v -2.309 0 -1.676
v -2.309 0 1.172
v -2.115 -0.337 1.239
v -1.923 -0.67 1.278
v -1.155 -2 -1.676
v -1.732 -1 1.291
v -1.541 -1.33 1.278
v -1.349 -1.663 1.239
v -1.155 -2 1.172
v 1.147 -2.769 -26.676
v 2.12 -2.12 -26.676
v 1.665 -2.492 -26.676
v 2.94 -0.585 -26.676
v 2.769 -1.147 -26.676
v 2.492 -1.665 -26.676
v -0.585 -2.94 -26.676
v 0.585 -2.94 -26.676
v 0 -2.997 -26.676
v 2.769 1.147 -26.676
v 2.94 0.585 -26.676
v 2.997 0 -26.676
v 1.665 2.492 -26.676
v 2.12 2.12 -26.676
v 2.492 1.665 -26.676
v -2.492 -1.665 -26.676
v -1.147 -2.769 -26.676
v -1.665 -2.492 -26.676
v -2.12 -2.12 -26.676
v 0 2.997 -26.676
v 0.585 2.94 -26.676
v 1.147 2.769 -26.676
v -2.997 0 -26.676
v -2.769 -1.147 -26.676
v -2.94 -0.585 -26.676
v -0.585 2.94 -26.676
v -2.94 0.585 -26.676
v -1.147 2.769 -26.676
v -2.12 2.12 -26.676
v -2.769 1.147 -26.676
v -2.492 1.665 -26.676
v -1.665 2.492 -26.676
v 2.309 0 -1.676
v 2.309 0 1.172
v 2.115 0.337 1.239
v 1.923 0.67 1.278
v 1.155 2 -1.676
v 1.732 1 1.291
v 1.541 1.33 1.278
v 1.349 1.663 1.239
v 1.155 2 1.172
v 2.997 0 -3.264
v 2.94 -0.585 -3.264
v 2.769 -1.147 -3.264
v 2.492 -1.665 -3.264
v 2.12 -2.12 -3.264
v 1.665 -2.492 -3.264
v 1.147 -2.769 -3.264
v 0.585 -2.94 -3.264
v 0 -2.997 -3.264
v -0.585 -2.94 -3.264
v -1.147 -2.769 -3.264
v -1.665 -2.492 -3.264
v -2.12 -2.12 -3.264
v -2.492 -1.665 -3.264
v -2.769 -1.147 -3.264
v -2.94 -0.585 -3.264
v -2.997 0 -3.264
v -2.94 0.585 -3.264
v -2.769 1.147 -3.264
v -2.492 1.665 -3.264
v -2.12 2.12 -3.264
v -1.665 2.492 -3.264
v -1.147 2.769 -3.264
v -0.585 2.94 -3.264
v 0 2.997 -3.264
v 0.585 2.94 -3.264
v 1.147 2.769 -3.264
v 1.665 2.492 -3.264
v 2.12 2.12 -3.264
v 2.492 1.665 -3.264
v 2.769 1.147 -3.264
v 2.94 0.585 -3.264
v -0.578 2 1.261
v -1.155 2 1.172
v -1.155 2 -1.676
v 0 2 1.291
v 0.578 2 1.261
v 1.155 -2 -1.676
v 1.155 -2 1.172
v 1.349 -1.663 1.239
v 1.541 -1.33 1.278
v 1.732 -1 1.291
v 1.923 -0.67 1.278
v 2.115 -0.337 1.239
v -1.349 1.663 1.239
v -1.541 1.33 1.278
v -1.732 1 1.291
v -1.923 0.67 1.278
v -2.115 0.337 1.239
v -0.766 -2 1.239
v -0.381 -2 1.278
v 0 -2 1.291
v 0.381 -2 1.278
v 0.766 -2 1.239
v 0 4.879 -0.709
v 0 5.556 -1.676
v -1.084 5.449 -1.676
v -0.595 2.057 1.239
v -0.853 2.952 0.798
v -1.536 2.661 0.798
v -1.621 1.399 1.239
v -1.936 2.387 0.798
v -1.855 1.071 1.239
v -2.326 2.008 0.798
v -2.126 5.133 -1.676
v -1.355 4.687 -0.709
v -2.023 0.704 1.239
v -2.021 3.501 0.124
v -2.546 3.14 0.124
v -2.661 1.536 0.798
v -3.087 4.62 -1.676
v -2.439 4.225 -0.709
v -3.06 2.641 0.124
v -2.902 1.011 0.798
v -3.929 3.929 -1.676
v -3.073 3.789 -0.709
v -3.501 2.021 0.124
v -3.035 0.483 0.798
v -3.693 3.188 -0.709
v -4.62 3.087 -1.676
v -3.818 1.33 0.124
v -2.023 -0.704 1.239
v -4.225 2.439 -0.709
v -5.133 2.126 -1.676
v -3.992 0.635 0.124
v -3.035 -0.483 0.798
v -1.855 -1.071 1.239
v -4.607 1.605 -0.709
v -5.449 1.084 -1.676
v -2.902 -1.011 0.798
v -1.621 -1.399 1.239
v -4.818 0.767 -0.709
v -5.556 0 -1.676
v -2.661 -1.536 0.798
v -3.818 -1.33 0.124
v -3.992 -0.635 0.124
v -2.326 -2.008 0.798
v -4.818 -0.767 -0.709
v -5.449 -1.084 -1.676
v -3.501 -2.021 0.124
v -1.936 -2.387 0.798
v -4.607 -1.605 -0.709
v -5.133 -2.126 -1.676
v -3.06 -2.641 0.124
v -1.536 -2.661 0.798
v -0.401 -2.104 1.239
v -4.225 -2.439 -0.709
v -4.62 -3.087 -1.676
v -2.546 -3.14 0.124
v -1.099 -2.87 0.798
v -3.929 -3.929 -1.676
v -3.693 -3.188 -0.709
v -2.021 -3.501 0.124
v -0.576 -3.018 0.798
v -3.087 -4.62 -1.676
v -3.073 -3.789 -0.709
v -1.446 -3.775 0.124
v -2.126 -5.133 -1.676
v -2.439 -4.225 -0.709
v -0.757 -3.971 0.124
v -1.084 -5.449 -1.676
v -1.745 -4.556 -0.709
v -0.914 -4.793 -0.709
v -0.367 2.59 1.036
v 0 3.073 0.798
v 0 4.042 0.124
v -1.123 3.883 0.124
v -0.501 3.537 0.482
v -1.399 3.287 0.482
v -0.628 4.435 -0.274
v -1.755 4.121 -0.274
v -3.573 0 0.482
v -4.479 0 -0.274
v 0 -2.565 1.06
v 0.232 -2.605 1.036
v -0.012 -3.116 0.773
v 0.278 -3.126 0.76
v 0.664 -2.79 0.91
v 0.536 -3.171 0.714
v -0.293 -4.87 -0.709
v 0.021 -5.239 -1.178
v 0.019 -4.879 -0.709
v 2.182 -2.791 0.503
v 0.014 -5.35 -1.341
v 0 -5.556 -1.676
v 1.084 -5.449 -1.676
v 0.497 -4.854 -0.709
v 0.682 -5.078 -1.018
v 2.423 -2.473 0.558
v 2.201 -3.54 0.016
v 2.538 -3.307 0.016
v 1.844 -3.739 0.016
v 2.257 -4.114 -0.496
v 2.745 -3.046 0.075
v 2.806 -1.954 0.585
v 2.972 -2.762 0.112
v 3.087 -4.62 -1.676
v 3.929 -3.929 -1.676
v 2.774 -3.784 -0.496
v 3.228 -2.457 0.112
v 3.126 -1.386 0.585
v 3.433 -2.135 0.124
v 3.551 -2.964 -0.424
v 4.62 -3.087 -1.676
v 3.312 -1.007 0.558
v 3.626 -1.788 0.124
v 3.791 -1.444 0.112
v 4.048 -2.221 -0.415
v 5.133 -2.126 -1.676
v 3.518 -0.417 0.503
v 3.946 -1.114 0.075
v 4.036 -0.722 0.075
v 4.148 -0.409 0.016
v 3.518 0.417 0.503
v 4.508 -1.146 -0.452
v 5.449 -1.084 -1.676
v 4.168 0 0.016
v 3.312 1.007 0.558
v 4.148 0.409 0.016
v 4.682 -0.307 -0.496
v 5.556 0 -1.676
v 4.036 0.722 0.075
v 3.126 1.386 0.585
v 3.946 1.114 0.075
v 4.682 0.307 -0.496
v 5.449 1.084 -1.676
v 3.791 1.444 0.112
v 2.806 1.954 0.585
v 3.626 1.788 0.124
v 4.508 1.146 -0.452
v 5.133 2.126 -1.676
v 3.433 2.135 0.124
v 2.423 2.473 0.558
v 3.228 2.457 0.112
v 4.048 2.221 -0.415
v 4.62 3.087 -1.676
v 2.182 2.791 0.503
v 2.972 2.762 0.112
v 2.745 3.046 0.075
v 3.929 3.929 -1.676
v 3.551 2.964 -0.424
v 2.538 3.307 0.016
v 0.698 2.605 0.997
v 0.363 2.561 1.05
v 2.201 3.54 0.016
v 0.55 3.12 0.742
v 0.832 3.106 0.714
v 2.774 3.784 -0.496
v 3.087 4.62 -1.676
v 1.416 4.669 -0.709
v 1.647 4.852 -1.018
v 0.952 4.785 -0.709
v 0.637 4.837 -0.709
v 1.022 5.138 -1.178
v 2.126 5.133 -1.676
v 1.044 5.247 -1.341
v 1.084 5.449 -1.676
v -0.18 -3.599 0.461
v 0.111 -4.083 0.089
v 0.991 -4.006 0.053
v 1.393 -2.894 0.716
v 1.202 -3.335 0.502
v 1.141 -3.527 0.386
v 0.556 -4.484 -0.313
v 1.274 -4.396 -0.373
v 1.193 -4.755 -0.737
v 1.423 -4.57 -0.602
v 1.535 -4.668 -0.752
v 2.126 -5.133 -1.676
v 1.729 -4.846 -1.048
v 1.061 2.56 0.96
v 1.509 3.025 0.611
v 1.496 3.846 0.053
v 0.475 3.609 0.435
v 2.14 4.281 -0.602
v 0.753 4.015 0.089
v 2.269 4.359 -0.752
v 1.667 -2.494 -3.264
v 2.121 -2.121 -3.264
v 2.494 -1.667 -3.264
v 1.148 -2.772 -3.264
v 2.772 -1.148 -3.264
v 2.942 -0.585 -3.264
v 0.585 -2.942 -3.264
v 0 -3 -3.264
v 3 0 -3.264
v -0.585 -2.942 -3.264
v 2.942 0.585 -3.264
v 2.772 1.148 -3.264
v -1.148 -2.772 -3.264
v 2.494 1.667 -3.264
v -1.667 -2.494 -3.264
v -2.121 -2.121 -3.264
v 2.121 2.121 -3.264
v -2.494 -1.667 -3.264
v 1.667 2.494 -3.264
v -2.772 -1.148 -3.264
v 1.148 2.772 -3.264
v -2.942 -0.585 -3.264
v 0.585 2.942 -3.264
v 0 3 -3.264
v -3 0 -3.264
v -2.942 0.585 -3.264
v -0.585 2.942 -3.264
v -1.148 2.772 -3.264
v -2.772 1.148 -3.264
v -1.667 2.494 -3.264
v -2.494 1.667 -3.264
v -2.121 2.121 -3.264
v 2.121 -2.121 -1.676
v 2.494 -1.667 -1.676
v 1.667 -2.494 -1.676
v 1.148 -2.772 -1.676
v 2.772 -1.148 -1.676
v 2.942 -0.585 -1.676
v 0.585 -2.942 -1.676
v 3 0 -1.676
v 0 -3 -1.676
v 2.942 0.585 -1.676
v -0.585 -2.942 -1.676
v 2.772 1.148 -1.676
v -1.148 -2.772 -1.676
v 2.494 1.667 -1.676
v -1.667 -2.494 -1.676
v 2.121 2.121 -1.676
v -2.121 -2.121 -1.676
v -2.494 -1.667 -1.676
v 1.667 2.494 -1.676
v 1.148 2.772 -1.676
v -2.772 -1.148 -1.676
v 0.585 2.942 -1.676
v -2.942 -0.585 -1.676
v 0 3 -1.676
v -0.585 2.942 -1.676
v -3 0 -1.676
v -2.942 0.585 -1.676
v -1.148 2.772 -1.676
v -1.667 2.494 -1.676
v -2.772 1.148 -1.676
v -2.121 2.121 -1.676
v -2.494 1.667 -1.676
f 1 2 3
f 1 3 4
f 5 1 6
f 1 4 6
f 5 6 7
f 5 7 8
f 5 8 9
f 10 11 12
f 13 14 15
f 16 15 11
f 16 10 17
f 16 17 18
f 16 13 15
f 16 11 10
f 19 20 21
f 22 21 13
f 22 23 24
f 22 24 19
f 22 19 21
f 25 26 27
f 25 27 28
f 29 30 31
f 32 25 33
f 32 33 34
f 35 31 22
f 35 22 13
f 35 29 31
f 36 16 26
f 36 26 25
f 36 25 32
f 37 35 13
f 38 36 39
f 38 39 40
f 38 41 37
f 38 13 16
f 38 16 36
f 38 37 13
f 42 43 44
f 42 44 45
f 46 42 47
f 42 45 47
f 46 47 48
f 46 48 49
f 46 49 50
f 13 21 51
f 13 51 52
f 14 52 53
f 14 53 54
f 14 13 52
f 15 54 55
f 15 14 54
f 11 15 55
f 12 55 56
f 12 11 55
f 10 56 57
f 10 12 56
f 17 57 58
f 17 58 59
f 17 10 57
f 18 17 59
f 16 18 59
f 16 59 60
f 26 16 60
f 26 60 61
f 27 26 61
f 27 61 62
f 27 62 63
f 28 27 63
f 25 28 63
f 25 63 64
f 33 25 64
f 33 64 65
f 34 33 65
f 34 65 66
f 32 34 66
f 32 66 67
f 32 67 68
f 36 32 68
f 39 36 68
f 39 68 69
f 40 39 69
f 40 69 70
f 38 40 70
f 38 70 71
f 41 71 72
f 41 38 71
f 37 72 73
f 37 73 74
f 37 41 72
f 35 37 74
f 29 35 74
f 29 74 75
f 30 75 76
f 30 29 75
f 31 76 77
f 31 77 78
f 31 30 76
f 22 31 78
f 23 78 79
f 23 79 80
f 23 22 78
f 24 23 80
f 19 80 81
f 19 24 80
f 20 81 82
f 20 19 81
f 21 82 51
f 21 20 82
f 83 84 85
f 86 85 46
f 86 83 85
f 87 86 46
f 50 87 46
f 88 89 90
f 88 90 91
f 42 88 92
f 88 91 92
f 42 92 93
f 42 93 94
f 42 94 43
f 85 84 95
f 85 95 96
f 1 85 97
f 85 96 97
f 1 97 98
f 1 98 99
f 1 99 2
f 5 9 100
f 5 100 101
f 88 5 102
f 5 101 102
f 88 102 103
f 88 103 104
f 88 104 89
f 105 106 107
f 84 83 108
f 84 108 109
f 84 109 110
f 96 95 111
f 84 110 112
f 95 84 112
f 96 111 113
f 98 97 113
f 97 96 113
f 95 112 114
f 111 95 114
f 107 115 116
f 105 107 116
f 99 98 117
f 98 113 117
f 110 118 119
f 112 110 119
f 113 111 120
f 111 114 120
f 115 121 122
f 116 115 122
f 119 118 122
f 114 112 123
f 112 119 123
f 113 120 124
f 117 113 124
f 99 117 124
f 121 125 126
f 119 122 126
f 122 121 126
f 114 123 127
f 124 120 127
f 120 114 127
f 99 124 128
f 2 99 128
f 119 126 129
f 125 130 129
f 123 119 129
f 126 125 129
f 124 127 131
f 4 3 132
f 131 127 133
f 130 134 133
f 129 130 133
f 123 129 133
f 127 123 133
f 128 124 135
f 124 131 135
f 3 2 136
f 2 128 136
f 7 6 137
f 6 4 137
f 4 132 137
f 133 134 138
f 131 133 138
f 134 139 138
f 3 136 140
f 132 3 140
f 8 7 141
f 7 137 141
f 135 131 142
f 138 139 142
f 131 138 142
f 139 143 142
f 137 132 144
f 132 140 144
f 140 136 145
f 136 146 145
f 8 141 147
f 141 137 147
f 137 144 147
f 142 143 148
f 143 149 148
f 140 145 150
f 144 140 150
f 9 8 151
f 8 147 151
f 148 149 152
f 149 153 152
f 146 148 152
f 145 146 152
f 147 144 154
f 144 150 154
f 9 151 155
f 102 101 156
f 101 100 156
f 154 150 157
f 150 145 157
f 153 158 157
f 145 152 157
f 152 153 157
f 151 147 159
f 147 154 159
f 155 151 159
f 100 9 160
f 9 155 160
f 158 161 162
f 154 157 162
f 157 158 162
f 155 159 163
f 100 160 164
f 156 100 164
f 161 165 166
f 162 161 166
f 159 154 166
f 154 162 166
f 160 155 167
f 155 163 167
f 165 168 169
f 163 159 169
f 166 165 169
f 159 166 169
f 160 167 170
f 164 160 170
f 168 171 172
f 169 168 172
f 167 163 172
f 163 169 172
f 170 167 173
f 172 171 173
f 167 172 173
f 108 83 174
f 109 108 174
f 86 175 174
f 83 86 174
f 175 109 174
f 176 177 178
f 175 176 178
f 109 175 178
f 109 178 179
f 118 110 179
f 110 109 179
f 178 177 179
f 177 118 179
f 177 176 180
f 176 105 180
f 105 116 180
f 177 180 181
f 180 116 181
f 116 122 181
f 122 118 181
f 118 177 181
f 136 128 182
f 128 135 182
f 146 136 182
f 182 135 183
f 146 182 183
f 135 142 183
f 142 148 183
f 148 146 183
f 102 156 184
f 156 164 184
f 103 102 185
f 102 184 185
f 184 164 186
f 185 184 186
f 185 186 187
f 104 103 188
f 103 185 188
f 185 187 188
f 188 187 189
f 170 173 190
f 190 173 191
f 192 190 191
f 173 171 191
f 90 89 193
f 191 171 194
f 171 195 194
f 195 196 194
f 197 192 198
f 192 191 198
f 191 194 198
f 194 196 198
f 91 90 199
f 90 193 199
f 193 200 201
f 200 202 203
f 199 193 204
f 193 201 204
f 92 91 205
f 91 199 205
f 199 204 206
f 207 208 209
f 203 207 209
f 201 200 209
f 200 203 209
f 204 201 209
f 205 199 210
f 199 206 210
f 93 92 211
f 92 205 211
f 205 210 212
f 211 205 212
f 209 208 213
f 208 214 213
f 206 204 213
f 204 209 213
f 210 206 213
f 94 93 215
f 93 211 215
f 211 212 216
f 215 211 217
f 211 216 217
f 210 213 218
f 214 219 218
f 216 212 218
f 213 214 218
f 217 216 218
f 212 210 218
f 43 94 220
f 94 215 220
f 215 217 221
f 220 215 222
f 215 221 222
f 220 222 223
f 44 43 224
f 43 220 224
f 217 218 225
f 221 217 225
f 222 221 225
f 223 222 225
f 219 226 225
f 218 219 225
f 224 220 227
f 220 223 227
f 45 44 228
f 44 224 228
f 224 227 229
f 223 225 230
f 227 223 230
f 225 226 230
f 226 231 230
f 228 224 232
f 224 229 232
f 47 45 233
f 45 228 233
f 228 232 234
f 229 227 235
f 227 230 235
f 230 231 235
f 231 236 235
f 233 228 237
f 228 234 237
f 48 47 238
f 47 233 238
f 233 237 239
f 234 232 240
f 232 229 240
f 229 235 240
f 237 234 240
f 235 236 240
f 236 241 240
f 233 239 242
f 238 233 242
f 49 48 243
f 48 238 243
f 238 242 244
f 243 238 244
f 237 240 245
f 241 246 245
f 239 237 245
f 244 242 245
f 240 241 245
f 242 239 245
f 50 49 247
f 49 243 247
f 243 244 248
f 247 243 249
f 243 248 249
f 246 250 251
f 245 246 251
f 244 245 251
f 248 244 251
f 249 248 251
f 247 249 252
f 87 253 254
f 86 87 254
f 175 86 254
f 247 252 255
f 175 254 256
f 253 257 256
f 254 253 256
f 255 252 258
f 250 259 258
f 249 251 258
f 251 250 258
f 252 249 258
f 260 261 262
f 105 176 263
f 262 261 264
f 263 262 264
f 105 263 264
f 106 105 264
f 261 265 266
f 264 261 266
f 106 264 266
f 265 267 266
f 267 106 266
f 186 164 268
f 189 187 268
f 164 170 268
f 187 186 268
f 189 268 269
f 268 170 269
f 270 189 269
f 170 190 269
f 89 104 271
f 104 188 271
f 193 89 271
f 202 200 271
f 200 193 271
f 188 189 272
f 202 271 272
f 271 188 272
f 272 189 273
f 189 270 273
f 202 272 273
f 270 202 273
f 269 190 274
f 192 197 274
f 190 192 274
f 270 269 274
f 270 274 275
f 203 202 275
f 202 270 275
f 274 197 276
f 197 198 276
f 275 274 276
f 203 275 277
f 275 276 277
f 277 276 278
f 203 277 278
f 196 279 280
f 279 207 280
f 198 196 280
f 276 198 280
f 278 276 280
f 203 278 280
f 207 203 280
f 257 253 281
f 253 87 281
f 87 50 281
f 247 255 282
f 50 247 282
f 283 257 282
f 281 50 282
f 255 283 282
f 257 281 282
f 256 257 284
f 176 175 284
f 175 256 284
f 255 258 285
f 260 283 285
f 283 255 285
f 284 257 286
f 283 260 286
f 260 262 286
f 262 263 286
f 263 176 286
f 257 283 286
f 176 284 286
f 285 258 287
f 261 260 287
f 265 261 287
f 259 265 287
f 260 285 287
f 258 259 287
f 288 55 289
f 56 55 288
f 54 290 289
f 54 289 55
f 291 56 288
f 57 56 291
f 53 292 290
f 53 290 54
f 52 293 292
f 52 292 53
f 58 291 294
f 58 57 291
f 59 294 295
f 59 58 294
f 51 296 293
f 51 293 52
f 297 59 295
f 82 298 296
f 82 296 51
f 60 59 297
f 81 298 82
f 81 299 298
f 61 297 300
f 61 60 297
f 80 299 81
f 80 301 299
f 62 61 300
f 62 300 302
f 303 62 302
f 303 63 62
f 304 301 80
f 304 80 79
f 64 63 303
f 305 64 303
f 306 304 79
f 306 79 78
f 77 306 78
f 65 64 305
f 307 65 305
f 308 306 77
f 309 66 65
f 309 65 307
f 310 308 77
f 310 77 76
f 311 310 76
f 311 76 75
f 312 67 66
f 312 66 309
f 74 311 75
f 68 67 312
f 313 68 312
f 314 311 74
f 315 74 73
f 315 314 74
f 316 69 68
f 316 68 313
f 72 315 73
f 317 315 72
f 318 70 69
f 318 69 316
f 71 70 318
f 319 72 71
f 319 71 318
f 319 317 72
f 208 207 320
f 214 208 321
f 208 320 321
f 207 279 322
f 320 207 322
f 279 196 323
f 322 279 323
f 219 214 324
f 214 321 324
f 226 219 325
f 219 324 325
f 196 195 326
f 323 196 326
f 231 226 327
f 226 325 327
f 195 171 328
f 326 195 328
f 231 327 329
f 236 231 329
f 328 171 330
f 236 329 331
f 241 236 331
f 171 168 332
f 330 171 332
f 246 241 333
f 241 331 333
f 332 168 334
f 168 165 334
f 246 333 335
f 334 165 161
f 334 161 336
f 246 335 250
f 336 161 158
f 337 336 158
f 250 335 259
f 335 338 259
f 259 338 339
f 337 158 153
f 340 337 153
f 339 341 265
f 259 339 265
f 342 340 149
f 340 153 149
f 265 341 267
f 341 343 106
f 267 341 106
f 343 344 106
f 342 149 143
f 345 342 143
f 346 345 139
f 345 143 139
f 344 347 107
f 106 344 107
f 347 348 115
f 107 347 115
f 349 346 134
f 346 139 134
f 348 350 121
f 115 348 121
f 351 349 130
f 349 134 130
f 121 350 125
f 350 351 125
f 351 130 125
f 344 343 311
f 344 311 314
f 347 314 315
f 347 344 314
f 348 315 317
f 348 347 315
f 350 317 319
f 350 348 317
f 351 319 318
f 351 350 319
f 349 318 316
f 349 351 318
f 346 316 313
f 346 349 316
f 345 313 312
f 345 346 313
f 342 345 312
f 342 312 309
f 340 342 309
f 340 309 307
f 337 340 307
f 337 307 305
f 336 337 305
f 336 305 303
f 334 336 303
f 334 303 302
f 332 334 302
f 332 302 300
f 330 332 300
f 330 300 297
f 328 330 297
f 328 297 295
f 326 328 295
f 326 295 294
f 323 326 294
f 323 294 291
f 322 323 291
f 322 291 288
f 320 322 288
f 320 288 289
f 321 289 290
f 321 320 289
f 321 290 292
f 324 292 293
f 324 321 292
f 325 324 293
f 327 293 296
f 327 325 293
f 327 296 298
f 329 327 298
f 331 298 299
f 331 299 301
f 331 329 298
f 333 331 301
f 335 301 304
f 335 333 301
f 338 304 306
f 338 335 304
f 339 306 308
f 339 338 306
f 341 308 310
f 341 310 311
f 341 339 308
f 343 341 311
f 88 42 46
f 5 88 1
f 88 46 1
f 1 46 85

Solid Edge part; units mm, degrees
sketch "Sketch1" plane through (0, 0, 0) normal (1, 0, 0) x (0, 1, 0)
  line L0 (0, -1.6764) -> (0, 1.6764)
  arc A0 (0, 1.6764) -> (5.55625, -1.6764) centre (-0.25374, -5.024398) cw
  line L1 (0, -1.6764) -> (5.55625, -1.6764)
  dimension "D1" = 3.3528
  dimension "D2" = 6.7056
revolve "RevolvedProtrusion1" add sketch "Sketch1" angle 360 about axis through (0, 0, -14.779625) along (0, 0, 1)
sketch "Sketch2" plane through (0, 0, -1.6764) normal (0, 0, -1) x (0, 1, 0)
  circle A0 centre (0, 0) radius 3
  dimension "D1" = 6
extrude "Protrusion1" add sketch "Sketch2" along normal blind 25
sketch "Sketch3" plane through (0, 0, -26.6764) normal (0, 0, -1) x (1, 0, 0)
  circle A0 centre (0, 0) radius 2.99746
  dimension "D1" = 0.0025
extrude "Cutout1" cut sketch "Sketch3" against normal blind 23.4125 flip side to cut
sketch "Sketch4" plane through (-0.603226, 0.360624, 3.3528) normal (0, 0, 1) x (1, 0, 0)
  line L0 (-0.551475, 1.639376) -> (1.757926, 1.639376)
  line L1 (2.912627, -0.360624) -> (1.757926, 1.639376)
  line L2 (1.757926, -2.360624) -> (2.912627, -0.360624)
  line L3 (-0.551475, -2.360624) -> (1.757926, -2.360624)
  line L4 (-1.706175, -0.360624) -> (-0.551475, -2.360624)
  line L5 (-0.551475, 1.639376) -> (-1.706175, -0.360624)
extrude "ExtrudedCutout_11" cut sketch "Sketch4" against normal blind 5.0292
properties part number "185818"
